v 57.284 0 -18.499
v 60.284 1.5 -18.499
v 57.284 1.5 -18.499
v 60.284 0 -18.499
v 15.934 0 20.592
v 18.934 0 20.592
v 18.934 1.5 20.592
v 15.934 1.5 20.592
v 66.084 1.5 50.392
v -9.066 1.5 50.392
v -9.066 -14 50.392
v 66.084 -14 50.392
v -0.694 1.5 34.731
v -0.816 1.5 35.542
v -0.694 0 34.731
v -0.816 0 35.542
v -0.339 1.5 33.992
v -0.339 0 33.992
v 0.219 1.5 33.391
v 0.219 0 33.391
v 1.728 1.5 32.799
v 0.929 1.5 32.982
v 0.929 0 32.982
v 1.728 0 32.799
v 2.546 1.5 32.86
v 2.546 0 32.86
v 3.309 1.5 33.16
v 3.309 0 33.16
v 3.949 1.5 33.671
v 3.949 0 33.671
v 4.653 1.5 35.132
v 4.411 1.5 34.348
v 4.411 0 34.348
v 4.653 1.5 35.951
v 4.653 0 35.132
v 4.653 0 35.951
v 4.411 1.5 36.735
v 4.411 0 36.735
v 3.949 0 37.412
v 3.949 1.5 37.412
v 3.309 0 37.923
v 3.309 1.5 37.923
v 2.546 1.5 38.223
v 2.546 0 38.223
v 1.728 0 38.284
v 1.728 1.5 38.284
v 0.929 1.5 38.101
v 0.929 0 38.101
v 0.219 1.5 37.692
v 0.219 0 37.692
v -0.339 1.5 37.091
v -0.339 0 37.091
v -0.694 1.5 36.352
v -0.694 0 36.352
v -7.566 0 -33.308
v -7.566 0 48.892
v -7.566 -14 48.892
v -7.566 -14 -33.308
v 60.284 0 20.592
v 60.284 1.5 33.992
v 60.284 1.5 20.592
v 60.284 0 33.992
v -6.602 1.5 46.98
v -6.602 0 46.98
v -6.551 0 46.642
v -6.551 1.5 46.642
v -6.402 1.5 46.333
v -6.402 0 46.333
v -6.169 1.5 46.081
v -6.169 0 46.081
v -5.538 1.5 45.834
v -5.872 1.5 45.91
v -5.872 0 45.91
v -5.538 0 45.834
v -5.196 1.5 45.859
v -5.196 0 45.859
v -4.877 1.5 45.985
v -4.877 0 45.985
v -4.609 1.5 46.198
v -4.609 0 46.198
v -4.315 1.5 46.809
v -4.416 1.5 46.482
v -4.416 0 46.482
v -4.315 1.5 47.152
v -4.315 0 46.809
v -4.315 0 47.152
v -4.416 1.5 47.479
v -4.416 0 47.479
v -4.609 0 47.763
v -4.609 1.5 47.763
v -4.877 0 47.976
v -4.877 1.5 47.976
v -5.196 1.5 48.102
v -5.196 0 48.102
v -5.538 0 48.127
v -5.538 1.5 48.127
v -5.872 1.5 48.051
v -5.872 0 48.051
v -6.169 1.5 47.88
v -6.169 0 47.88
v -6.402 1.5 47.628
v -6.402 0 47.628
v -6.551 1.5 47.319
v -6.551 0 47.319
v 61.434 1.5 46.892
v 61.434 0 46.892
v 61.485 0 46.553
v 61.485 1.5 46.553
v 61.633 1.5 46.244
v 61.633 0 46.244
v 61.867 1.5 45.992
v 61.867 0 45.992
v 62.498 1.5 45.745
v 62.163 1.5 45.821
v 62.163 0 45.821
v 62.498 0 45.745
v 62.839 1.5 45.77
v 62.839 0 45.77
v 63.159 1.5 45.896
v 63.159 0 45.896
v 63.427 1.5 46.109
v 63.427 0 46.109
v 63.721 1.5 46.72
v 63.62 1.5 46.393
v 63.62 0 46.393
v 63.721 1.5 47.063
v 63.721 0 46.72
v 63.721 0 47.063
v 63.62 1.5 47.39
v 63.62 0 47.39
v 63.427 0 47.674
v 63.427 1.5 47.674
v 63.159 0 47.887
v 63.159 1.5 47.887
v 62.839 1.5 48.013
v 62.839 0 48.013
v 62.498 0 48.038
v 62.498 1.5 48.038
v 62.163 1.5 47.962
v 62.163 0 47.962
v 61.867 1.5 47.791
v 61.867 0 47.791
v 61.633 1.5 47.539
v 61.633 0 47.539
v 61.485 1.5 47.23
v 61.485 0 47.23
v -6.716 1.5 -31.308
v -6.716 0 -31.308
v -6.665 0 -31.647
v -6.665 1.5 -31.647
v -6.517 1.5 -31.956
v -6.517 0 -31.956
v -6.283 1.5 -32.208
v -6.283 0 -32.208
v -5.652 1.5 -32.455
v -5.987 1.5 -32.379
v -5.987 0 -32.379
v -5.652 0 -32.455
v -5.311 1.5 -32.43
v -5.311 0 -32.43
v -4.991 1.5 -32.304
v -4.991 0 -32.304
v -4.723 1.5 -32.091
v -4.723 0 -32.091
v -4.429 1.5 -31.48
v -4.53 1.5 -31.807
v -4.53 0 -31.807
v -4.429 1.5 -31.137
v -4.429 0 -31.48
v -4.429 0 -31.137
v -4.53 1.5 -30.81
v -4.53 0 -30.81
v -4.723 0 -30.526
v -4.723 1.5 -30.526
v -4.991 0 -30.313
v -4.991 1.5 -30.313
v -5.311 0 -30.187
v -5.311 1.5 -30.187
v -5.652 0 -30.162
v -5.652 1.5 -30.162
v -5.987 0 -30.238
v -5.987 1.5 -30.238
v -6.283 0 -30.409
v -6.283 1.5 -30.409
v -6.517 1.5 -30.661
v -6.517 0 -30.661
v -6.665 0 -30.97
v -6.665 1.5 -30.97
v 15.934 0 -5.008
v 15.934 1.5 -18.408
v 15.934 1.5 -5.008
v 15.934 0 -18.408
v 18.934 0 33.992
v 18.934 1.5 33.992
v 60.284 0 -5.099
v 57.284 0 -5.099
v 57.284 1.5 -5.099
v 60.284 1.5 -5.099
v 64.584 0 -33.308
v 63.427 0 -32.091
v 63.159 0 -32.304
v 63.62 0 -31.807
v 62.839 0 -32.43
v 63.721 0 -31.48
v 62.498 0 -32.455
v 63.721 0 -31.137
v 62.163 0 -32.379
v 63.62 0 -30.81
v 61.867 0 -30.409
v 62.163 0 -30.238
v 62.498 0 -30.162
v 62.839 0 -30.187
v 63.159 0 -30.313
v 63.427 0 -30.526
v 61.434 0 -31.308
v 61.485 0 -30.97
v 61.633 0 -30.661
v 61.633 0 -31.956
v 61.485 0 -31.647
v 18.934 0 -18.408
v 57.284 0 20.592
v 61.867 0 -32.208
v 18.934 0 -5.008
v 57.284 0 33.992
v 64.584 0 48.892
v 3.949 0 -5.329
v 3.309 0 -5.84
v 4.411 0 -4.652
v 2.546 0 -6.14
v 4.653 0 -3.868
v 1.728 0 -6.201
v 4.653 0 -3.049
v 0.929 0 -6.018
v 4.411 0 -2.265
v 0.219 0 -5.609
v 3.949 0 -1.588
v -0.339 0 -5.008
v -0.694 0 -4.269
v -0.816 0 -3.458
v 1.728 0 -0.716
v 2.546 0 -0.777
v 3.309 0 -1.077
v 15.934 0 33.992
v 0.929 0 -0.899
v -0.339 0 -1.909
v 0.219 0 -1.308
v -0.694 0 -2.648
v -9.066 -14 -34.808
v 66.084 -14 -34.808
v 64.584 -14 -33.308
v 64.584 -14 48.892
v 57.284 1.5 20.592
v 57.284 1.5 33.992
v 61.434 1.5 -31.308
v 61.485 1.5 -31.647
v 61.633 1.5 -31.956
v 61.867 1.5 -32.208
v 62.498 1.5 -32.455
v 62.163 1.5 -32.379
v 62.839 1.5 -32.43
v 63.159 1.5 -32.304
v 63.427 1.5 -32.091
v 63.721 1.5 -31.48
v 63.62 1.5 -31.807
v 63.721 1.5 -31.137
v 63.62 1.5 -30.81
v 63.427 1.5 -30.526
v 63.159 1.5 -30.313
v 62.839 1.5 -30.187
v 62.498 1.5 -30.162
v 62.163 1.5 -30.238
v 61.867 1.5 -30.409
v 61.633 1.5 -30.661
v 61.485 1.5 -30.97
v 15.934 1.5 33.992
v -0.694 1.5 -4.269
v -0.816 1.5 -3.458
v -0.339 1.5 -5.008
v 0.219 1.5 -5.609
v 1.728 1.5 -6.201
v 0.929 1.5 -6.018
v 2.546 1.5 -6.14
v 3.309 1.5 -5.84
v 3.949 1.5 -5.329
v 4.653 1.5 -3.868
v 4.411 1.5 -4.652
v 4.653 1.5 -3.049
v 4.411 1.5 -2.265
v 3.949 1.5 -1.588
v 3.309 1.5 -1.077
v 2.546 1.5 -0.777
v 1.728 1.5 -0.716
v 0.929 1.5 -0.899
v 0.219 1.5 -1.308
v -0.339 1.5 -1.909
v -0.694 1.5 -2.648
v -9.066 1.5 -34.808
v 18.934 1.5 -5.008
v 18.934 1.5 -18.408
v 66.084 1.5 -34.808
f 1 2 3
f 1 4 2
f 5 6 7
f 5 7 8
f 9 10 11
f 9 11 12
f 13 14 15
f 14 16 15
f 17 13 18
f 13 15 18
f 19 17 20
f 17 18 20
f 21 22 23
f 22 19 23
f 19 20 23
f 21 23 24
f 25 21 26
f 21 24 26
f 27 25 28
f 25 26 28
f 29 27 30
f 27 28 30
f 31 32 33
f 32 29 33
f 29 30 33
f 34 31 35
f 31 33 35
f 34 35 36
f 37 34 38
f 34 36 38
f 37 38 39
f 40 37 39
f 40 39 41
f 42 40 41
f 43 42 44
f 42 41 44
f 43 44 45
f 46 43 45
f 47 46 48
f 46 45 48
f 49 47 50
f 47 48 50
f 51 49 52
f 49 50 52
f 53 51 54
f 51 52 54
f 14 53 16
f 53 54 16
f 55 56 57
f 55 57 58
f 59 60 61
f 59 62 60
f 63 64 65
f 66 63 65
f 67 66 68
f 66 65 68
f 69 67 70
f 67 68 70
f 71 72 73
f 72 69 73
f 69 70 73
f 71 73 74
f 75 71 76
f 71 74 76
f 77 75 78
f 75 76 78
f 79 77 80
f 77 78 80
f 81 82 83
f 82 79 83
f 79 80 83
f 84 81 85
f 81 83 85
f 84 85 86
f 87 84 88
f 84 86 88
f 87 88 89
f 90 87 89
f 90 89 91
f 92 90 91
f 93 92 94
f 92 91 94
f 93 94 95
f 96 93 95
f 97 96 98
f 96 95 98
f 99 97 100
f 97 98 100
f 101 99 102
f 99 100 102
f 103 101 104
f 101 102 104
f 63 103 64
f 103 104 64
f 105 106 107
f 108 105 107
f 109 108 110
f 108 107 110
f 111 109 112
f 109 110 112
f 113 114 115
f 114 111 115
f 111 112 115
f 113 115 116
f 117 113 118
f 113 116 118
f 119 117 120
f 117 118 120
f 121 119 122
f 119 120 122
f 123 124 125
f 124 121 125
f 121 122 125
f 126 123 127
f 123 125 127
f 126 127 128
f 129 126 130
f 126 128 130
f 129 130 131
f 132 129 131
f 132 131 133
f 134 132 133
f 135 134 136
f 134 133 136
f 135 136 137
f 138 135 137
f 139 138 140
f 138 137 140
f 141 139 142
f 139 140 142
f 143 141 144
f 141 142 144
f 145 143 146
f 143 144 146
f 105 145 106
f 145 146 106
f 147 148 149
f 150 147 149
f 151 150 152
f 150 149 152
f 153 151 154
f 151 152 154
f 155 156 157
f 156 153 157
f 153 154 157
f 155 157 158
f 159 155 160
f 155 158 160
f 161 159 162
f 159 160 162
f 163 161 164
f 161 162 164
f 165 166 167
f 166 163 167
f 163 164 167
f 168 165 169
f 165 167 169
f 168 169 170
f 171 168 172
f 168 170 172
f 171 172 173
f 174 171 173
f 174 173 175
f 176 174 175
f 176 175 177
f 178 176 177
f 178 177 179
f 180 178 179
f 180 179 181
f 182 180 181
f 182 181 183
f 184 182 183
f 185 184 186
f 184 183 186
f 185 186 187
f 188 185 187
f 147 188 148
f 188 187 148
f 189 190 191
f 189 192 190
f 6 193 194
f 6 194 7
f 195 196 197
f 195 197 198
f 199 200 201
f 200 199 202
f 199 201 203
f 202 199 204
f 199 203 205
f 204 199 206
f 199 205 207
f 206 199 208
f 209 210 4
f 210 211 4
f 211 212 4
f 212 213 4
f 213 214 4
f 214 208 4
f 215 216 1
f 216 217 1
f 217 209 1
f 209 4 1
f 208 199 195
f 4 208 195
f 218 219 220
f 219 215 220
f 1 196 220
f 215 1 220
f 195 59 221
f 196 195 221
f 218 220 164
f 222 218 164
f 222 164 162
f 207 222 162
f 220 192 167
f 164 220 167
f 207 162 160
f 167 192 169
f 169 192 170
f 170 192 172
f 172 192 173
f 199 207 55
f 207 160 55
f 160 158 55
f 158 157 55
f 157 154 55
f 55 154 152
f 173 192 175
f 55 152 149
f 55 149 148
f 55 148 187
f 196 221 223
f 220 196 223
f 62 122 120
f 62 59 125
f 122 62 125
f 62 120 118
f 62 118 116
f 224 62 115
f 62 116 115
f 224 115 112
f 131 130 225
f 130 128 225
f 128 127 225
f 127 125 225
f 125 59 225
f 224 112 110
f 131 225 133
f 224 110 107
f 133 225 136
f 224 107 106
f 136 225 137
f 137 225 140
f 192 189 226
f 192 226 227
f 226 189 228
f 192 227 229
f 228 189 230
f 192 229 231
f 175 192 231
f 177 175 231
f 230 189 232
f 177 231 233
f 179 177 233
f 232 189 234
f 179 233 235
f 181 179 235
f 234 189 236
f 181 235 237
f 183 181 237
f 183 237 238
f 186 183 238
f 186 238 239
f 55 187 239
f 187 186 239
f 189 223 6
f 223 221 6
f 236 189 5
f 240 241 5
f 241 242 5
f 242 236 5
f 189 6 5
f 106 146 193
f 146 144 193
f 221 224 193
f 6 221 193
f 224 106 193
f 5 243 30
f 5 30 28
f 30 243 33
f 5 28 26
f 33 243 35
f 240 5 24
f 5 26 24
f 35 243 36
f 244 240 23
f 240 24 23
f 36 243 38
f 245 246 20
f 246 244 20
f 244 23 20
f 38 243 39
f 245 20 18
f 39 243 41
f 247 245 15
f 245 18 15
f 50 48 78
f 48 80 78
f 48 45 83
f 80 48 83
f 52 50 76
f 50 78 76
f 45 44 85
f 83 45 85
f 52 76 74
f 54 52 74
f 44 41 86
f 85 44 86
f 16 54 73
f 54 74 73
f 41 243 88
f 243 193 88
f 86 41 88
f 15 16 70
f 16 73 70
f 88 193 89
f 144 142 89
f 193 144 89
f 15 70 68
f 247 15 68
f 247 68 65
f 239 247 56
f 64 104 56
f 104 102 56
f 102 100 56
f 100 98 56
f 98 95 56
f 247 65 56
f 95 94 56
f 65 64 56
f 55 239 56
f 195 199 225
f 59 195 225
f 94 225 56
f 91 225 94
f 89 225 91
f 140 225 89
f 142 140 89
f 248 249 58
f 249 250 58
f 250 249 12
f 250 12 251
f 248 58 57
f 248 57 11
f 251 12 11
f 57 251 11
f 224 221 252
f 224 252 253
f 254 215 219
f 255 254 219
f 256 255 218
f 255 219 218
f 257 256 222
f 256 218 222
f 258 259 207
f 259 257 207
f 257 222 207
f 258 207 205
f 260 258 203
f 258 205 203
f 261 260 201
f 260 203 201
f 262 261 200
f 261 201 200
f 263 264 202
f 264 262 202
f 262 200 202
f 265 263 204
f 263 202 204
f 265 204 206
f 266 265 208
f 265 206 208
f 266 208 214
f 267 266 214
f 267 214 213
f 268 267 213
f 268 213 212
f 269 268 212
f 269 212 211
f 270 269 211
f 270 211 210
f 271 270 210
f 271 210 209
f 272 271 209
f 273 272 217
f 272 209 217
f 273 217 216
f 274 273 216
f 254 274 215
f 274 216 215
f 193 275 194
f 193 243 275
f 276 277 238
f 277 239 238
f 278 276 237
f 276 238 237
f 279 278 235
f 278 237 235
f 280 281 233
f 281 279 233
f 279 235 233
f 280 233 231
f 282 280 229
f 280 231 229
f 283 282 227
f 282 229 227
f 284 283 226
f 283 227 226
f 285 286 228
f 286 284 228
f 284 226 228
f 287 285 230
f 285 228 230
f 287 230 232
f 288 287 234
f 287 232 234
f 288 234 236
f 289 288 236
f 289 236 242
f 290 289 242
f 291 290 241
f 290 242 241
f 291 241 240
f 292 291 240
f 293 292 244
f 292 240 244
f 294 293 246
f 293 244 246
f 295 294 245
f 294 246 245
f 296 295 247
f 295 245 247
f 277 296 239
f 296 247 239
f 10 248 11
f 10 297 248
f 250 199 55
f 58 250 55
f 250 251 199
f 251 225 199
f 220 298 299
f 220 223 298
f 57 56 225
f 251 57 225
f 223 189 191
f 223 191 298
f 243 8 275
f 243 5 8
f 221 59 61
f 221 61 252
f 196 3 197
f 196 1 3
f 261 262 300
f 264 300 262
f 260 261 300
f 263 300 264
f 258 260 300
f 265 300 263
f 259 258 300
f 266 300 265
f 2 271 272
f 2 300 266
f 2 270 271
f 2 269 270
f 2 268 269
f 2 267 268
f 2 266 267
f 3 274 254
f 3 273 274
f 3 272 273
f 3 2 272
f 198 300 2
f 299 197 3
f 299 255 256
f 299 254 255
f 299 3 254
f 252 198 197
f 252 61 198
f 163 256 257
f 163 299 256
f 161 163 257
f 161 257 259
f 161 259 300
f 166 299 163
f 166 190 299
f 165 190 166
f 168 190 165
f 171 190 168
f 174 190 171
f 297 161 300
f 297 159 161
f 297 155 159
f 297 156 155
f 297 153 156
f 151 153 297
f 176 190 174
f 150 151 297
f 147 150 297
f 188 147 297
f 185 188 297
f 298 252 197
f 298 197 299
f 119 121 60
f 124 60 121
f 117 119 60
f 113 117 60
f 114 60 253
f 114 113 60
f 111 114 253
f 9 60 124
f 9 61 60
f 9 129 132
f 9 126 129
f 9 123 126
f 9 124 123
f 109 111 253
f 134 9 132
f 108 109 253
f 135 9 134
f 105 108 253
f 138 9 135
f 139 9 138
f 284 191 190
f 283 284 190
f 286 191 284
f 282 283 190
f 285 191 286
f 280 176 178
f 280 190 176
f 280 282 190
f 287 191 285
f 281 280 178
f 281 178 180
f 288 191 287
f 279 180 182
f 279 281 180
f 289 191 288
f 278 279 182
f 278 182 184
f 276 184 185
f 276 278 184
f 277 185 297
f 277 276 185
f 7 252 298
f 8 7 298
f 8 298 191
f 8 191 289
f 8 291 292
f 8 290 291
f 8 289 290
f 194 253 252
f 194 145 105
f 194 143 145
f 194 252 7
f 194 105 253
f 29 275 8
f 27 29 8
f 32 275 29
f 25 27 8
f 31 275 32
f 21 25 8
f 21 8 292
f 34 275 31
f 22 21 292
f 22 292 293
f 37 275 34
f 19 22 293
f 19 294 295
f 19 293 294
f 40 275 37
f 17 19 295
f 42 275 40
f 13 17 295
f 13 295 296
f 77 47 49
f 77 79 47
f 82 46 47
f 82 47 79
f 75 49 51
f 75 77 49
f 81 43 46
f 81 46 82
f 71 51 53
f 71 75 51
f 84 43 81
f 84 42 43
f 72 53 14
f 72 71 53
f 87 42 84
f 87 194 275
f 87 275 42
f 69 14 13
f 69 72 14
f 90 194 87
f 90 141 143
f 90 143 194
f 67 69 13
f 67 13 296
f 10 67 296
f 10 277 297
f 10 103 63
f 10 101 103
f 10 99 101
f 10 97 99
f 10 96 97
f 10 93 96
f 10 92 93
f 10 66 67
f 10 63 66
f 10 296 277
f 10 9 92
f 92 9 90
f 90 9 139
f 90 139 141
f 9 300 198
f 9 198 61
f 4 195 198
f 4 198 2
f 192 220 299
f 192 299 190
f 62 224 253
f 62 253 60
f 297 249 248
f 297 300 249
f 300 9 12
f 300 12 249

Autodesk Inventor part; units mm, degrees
ref_plane "YZ Plane" through (0, 0, 0) normal (1, 0, 0) x (0, 1, 0)
ref_plane "XZ Plane" through (0, 0, 0) normal (0, 1, 0) x (-1, 0, 0)
ref_plane "XY Plane" through (0, 0, 0) normal (0, 0, 1) x (1, 0, 0)
sketch "Sketch1" plane through (0, 0, 0) normal (0, 1, 0) x (-1, 0, 0)
  line L0 (-58.4836, 42.7915) -> (-27.4836, 42.7915) construction
  line L1 (-27.4836, 42.7915) -> (-27.4836, 11.7915) construction
  line L2 (-27.4836, 11.7915) -> (-58.4836, 11.7915) construction
  line L3 (-58.4836, 11.7915) -> (-58.4836, 20.5915) construction
  line L4 (-58.4836, 42.7915) -> (-27.4836, 11.7915) construction
  line L5 (-27.4836, 42.7915) -> (-58.4836, 11.7915) construction
  line L6 (-58.4836, 3.6103) -> (-27.4836, 3.6103) construction
  line L7 (-27.4836, 3.6103) -> (-27.4836, -27.2085) construction
  line L8 (-27.4836, -27.2085) -> (-58.4836, -27.2085) construction
  line L9 (-58.4836, -27.2085) -> (-58.4836, -18.4991) construction
  line L10 (-58.4836, 3.6103) -> (-27.4836, -27.2085) construction
  line L11 (-20.4336, 38.5415) -> (2.0664, 38.5415) construction
  line L12 (2.0664, 38.5415) -> (2.0664, 16.0415) construction
  line L13 (2.0664, 16.0415) -> (-20.4336, 16.0415) construction
  line L14 (-20.4336, 16.0415) -> (-20.4336, 38.5415) construction
  line L15 (-20.4336, 38.5415) -> (2.0664, 16.0415) construction
  line L16 (2.0664, 38.5415) -> (-20.4336, 16.0415) construction
  line L17 (-20.5481, -0.4585) -> (2.0664, -0.4585) construction
  line L18 (2.0664, -0.4585) -> (2.0664, -22.9585) construction
  line L19 (2.0664, -22.9585) -> (-20.5481, -22.9585) construction
  line L20 (-20.5481, -22.9585) -> (-20.5481, -0.4585) construction
  line L21 (-20.5481, -0.4585) -> (2.0664, -22.9585) construction
  line L22 (2.0664, -0.4585) -> (-20.5481, -22.9585) construction
  line L23 (3.5664, -29.3085) -> (-60.5836, -29.3085) construction
  line L24 (-60.5836, -29.3085) -> (-60.5836, 44.8915) construction
  line L25 (-60.5836, 44.8915) -> (-64.5836, 44.8915) construction
  line L26 (-64.5836, 44.8915) -> (-64.5836, 48.8915)
  line L27 (-64.5836, 48.8915) -> (-60.5836, 48.8915)
  line L28 (-60.5836, 48.8915) -> (-60.5836, 44.8915) construction
  line L29 (-60.5836, -29.3085) -> (-64.5836, -29.3085) construction
  line L30 (-64.5836, -29.3085) -> (-64.5836, -33.3085)
  line L31 (-64.5836, -33.3085) -> (-60.5836, -33.3085)
  line L32 (-60.5836, -33.3085) -> (-60.5836, -29.3085) construction
  line L33 (3.5664, -29.3085) -> (7.5664, -29.3085) construction
  line L34 (7.5664, -29.3085) -> (7.5664, -33.3085)
  line L35 (7.5664, -33.3085) -> (3.5664, -33.3085)
  line L36 (3.5664, -33.3085) -> (3.5664, -29.3085) construction
  line L37 (3.5664, 44.8915) -> (7.5664, 44.8915) construction
  line L38 (7.5664, 44.8915) -> (7.5664, 48.8915)
  line L39 (7.5664, 48.8915) -> (3.5664, 48.8915)
  line L40 (3.5664, 48.8915) -> (3.5664, 44.8915) construction
  circle A0 centre (5.4519, 46.9805) radius 1.15
  circle A1 centre (-62.5836, 46.8915) radius 1.15
  circle A2 centre (-62.5836, -31.3085) radius 1.15
  circle A3 centre (5.5664, -31.3085) radius 1.15
  line L41 (3.5664, 48.8915) -> (-60.5836, 48.8915)
  line L42 (-64.5836, 44.8915) -> (-64.5836, -29.3085)
  line L43 (-60.5836, -33.3085) -> (3.5664, -33.3085)
  line L44 (7.5664, -29.3085) -> (7.5664, 44.8915)
  line L45 (3.5664, 44.8915) -> (-60.5836, 44.8915) construction
  line L46 (3.5664, 44.8915) -> (3.5664, -29.3085) construction
  line L47 (-57.2836, 33.9915) -> (-60.2836, 33.9915)
  line L48 (-60.2836, 33.9915) -> (-60.2836, 20.5915)
  line L49 (-60.2836, 20.5915) -> (-57.2836, 20.5915)
  line L50 (-57.2836, 20.5915) -> (-57.2836, 33.9915)
  line L51 (-57.2836, -5.0991) -> (-60.2836, -5.0991)
  line L52 (-60.2836, -5.0991) -> (-60.2836, -18.4991)
  line L53 (-60.2836, -18.4991) -> (-57.2836, -18.4991)
  line L54 (-57.2836, -18.4991) -> (-57.2836, -5.0991)
  line L55 (-58.4836, 20.5915) -> (-58.4836, 33.9915) construction
  line L56 (-58.4836, 33.9915) -> (-58.4836, 42.7915) construction
  line L57 (-58.4836, -5.0991) -> (-58.4836, 3.6103) construction
  line L58 (-58.4836, -18.4991) -> (-58.4836, -5.0991) construction
  line L59 (-62.5836, 46.8915) -> (-60.5836, 46.8915) construction
  line L60 (-62.5836, 46.8915) -> (-62.5836, 44.8915) construction
  line L61 (-62.5836, 46.8915) -> (-64.5836, 46.8915) construction
  line L62 (-62.5836, 46.8915) -> (-62.5836, 48.8915) construction
  line L63 (-64.5836, -31.3085) -> (-62.5836, -31.3085) construction
  line L64 (-62.5836, -31.3085) -> (-60.5836, -31.3085) construction
  line L65 (-62.5836, -31.3085) -> (-62.5836, -29.3085) construction
  line L66 (-62.5836, -31.3085) -> (-62.5836, -33.3085) construction
  line L67 (5.5664, 46.8915) -> (3.5664, 46.8915) construction
  line L68 (5.5664, 46.8915) -> (7.5664, 46.8915) construction
  line L69 (5.5664, 46.8915) -> (5.5664, 44.8915) construction
  line L70 (5.5664, 44.8915) -> (5.5664, 46.8915) construction
  line L71 (5.5664, 46.8915) -> (5.5664, 48.8915) construction
  line L72 (5.5664, -31.3085) -> (5.5664, -33.3085) construction
  line L73 (5.5664, -31.3085) -> (3.5664, -31.3085) construction
  line L74 (5.5664, -31.3085) -> (5.5664, -29.3085) construction
  line L75 (5.5664, -31.3085) -> (7.5664, -31.3085) construction
  circle A4 centre (-1.9336, 35.5415) radius 2.75
  circle A5 centre (-1.9336, -3.4585) radius 2.75
  line L76 (-1.9336, 35.5415) -> (-1.9336, 38.5415) construction
  line L77 (-1.9336, 35.5415) -> (2.0664, 35.5415) construction
  line L78 (-1.9336, -3.4585) -> (2.0664, -3.4585) construction
  line L79 (-1.9336, -3.4585) -> (-1.9336, -0.4585) construction
  line L80 (-15.9336, 33.9915) -> (-18.9336, 33.9915)
  line L81 (-18.9336, 33.9915) -> (-18.9336, 20.5915)
  line L82 (-18.9336, 20.5915) -> (-15.9336, 20.5915)
  line L83 (-15.9336, 20.5915) -> (-15.9336, 33.9915)
  line L84 (-15.9336, -5.0085) -> (-18.9336, -5.0085)
  line L85 (-18.9336, -5.0085) -> (-18.9336, -18.4085)
  line L86 (-18.9336, -18.4085) -> (-15.9336, -18.4085)
  line L87 (-15.9336, -18.4085) -> (-15.9336, -5.0085)
  line L88 (9.0664, 50.3915) -> (-66.0836, 50.3915)
  line L89 (-66.0836, 50.3915) -> (-66.0836, -34.8085)
  line L90 (-66.0836, -34.8085) -> (9.0664, -34.8085)
  line L91 (9.0664, -34.8085) -> (9.0664, 50.3915)
  point P0 (-89.8981, -75.7195)
  dimension "d0" = 22.5
  dimension "d5" = 31
  dimension "d7" = 22.5
  dimension "d11" = 4
  dimension "d12" = 72.15
  dimension "d13" = 82.2
  dimension "d14" = 2.3
  dimension "d15" = 31
  dimension "d16" = 5.5
  dimension "d17" = 5.5
  dimension "d18" = 10.35
  dimension "d19" = 10.35
  dimension "d20" = 6.1
  dimension "d21" = 6.1
  dimension "d22" = 6.1
  dimension "d23" = 6.1
  dimension "d24" = 3
  dimension "d25" = 13.4
  dimension "d26" = 1.2
  dimension "d27" = 8.1812
  dimension "d28" = 16.5
  dimension "d29" = 5.5
  dimension "d30" = 5.5
  dimension "d31" = 3
  dimension "d32" = 4
  dimension "d33" = 1.5
  dimension "d34" = 4.55
  dimension "d35" = 4.55
  dimension "d36" = 4.55
  dimension "d37" = 1.5
  dimension "d38" = 1.5
  dimension "d39" = 1.5
  dimension "d40" = 1.5
extrude "Edges" add sketch "Sketch1" against normal blind 14 contours L91 L90 L89 L88
extrude "Surface" add sketch "Sketch1" along normal blind 1.5 contours L26 L27 L41 L39 L38 L44 L34 L35 L43 L31 L30 L42 | L91 L90 L89 L88
properties part number "CameraBoardCover" material "NylonD2W"
